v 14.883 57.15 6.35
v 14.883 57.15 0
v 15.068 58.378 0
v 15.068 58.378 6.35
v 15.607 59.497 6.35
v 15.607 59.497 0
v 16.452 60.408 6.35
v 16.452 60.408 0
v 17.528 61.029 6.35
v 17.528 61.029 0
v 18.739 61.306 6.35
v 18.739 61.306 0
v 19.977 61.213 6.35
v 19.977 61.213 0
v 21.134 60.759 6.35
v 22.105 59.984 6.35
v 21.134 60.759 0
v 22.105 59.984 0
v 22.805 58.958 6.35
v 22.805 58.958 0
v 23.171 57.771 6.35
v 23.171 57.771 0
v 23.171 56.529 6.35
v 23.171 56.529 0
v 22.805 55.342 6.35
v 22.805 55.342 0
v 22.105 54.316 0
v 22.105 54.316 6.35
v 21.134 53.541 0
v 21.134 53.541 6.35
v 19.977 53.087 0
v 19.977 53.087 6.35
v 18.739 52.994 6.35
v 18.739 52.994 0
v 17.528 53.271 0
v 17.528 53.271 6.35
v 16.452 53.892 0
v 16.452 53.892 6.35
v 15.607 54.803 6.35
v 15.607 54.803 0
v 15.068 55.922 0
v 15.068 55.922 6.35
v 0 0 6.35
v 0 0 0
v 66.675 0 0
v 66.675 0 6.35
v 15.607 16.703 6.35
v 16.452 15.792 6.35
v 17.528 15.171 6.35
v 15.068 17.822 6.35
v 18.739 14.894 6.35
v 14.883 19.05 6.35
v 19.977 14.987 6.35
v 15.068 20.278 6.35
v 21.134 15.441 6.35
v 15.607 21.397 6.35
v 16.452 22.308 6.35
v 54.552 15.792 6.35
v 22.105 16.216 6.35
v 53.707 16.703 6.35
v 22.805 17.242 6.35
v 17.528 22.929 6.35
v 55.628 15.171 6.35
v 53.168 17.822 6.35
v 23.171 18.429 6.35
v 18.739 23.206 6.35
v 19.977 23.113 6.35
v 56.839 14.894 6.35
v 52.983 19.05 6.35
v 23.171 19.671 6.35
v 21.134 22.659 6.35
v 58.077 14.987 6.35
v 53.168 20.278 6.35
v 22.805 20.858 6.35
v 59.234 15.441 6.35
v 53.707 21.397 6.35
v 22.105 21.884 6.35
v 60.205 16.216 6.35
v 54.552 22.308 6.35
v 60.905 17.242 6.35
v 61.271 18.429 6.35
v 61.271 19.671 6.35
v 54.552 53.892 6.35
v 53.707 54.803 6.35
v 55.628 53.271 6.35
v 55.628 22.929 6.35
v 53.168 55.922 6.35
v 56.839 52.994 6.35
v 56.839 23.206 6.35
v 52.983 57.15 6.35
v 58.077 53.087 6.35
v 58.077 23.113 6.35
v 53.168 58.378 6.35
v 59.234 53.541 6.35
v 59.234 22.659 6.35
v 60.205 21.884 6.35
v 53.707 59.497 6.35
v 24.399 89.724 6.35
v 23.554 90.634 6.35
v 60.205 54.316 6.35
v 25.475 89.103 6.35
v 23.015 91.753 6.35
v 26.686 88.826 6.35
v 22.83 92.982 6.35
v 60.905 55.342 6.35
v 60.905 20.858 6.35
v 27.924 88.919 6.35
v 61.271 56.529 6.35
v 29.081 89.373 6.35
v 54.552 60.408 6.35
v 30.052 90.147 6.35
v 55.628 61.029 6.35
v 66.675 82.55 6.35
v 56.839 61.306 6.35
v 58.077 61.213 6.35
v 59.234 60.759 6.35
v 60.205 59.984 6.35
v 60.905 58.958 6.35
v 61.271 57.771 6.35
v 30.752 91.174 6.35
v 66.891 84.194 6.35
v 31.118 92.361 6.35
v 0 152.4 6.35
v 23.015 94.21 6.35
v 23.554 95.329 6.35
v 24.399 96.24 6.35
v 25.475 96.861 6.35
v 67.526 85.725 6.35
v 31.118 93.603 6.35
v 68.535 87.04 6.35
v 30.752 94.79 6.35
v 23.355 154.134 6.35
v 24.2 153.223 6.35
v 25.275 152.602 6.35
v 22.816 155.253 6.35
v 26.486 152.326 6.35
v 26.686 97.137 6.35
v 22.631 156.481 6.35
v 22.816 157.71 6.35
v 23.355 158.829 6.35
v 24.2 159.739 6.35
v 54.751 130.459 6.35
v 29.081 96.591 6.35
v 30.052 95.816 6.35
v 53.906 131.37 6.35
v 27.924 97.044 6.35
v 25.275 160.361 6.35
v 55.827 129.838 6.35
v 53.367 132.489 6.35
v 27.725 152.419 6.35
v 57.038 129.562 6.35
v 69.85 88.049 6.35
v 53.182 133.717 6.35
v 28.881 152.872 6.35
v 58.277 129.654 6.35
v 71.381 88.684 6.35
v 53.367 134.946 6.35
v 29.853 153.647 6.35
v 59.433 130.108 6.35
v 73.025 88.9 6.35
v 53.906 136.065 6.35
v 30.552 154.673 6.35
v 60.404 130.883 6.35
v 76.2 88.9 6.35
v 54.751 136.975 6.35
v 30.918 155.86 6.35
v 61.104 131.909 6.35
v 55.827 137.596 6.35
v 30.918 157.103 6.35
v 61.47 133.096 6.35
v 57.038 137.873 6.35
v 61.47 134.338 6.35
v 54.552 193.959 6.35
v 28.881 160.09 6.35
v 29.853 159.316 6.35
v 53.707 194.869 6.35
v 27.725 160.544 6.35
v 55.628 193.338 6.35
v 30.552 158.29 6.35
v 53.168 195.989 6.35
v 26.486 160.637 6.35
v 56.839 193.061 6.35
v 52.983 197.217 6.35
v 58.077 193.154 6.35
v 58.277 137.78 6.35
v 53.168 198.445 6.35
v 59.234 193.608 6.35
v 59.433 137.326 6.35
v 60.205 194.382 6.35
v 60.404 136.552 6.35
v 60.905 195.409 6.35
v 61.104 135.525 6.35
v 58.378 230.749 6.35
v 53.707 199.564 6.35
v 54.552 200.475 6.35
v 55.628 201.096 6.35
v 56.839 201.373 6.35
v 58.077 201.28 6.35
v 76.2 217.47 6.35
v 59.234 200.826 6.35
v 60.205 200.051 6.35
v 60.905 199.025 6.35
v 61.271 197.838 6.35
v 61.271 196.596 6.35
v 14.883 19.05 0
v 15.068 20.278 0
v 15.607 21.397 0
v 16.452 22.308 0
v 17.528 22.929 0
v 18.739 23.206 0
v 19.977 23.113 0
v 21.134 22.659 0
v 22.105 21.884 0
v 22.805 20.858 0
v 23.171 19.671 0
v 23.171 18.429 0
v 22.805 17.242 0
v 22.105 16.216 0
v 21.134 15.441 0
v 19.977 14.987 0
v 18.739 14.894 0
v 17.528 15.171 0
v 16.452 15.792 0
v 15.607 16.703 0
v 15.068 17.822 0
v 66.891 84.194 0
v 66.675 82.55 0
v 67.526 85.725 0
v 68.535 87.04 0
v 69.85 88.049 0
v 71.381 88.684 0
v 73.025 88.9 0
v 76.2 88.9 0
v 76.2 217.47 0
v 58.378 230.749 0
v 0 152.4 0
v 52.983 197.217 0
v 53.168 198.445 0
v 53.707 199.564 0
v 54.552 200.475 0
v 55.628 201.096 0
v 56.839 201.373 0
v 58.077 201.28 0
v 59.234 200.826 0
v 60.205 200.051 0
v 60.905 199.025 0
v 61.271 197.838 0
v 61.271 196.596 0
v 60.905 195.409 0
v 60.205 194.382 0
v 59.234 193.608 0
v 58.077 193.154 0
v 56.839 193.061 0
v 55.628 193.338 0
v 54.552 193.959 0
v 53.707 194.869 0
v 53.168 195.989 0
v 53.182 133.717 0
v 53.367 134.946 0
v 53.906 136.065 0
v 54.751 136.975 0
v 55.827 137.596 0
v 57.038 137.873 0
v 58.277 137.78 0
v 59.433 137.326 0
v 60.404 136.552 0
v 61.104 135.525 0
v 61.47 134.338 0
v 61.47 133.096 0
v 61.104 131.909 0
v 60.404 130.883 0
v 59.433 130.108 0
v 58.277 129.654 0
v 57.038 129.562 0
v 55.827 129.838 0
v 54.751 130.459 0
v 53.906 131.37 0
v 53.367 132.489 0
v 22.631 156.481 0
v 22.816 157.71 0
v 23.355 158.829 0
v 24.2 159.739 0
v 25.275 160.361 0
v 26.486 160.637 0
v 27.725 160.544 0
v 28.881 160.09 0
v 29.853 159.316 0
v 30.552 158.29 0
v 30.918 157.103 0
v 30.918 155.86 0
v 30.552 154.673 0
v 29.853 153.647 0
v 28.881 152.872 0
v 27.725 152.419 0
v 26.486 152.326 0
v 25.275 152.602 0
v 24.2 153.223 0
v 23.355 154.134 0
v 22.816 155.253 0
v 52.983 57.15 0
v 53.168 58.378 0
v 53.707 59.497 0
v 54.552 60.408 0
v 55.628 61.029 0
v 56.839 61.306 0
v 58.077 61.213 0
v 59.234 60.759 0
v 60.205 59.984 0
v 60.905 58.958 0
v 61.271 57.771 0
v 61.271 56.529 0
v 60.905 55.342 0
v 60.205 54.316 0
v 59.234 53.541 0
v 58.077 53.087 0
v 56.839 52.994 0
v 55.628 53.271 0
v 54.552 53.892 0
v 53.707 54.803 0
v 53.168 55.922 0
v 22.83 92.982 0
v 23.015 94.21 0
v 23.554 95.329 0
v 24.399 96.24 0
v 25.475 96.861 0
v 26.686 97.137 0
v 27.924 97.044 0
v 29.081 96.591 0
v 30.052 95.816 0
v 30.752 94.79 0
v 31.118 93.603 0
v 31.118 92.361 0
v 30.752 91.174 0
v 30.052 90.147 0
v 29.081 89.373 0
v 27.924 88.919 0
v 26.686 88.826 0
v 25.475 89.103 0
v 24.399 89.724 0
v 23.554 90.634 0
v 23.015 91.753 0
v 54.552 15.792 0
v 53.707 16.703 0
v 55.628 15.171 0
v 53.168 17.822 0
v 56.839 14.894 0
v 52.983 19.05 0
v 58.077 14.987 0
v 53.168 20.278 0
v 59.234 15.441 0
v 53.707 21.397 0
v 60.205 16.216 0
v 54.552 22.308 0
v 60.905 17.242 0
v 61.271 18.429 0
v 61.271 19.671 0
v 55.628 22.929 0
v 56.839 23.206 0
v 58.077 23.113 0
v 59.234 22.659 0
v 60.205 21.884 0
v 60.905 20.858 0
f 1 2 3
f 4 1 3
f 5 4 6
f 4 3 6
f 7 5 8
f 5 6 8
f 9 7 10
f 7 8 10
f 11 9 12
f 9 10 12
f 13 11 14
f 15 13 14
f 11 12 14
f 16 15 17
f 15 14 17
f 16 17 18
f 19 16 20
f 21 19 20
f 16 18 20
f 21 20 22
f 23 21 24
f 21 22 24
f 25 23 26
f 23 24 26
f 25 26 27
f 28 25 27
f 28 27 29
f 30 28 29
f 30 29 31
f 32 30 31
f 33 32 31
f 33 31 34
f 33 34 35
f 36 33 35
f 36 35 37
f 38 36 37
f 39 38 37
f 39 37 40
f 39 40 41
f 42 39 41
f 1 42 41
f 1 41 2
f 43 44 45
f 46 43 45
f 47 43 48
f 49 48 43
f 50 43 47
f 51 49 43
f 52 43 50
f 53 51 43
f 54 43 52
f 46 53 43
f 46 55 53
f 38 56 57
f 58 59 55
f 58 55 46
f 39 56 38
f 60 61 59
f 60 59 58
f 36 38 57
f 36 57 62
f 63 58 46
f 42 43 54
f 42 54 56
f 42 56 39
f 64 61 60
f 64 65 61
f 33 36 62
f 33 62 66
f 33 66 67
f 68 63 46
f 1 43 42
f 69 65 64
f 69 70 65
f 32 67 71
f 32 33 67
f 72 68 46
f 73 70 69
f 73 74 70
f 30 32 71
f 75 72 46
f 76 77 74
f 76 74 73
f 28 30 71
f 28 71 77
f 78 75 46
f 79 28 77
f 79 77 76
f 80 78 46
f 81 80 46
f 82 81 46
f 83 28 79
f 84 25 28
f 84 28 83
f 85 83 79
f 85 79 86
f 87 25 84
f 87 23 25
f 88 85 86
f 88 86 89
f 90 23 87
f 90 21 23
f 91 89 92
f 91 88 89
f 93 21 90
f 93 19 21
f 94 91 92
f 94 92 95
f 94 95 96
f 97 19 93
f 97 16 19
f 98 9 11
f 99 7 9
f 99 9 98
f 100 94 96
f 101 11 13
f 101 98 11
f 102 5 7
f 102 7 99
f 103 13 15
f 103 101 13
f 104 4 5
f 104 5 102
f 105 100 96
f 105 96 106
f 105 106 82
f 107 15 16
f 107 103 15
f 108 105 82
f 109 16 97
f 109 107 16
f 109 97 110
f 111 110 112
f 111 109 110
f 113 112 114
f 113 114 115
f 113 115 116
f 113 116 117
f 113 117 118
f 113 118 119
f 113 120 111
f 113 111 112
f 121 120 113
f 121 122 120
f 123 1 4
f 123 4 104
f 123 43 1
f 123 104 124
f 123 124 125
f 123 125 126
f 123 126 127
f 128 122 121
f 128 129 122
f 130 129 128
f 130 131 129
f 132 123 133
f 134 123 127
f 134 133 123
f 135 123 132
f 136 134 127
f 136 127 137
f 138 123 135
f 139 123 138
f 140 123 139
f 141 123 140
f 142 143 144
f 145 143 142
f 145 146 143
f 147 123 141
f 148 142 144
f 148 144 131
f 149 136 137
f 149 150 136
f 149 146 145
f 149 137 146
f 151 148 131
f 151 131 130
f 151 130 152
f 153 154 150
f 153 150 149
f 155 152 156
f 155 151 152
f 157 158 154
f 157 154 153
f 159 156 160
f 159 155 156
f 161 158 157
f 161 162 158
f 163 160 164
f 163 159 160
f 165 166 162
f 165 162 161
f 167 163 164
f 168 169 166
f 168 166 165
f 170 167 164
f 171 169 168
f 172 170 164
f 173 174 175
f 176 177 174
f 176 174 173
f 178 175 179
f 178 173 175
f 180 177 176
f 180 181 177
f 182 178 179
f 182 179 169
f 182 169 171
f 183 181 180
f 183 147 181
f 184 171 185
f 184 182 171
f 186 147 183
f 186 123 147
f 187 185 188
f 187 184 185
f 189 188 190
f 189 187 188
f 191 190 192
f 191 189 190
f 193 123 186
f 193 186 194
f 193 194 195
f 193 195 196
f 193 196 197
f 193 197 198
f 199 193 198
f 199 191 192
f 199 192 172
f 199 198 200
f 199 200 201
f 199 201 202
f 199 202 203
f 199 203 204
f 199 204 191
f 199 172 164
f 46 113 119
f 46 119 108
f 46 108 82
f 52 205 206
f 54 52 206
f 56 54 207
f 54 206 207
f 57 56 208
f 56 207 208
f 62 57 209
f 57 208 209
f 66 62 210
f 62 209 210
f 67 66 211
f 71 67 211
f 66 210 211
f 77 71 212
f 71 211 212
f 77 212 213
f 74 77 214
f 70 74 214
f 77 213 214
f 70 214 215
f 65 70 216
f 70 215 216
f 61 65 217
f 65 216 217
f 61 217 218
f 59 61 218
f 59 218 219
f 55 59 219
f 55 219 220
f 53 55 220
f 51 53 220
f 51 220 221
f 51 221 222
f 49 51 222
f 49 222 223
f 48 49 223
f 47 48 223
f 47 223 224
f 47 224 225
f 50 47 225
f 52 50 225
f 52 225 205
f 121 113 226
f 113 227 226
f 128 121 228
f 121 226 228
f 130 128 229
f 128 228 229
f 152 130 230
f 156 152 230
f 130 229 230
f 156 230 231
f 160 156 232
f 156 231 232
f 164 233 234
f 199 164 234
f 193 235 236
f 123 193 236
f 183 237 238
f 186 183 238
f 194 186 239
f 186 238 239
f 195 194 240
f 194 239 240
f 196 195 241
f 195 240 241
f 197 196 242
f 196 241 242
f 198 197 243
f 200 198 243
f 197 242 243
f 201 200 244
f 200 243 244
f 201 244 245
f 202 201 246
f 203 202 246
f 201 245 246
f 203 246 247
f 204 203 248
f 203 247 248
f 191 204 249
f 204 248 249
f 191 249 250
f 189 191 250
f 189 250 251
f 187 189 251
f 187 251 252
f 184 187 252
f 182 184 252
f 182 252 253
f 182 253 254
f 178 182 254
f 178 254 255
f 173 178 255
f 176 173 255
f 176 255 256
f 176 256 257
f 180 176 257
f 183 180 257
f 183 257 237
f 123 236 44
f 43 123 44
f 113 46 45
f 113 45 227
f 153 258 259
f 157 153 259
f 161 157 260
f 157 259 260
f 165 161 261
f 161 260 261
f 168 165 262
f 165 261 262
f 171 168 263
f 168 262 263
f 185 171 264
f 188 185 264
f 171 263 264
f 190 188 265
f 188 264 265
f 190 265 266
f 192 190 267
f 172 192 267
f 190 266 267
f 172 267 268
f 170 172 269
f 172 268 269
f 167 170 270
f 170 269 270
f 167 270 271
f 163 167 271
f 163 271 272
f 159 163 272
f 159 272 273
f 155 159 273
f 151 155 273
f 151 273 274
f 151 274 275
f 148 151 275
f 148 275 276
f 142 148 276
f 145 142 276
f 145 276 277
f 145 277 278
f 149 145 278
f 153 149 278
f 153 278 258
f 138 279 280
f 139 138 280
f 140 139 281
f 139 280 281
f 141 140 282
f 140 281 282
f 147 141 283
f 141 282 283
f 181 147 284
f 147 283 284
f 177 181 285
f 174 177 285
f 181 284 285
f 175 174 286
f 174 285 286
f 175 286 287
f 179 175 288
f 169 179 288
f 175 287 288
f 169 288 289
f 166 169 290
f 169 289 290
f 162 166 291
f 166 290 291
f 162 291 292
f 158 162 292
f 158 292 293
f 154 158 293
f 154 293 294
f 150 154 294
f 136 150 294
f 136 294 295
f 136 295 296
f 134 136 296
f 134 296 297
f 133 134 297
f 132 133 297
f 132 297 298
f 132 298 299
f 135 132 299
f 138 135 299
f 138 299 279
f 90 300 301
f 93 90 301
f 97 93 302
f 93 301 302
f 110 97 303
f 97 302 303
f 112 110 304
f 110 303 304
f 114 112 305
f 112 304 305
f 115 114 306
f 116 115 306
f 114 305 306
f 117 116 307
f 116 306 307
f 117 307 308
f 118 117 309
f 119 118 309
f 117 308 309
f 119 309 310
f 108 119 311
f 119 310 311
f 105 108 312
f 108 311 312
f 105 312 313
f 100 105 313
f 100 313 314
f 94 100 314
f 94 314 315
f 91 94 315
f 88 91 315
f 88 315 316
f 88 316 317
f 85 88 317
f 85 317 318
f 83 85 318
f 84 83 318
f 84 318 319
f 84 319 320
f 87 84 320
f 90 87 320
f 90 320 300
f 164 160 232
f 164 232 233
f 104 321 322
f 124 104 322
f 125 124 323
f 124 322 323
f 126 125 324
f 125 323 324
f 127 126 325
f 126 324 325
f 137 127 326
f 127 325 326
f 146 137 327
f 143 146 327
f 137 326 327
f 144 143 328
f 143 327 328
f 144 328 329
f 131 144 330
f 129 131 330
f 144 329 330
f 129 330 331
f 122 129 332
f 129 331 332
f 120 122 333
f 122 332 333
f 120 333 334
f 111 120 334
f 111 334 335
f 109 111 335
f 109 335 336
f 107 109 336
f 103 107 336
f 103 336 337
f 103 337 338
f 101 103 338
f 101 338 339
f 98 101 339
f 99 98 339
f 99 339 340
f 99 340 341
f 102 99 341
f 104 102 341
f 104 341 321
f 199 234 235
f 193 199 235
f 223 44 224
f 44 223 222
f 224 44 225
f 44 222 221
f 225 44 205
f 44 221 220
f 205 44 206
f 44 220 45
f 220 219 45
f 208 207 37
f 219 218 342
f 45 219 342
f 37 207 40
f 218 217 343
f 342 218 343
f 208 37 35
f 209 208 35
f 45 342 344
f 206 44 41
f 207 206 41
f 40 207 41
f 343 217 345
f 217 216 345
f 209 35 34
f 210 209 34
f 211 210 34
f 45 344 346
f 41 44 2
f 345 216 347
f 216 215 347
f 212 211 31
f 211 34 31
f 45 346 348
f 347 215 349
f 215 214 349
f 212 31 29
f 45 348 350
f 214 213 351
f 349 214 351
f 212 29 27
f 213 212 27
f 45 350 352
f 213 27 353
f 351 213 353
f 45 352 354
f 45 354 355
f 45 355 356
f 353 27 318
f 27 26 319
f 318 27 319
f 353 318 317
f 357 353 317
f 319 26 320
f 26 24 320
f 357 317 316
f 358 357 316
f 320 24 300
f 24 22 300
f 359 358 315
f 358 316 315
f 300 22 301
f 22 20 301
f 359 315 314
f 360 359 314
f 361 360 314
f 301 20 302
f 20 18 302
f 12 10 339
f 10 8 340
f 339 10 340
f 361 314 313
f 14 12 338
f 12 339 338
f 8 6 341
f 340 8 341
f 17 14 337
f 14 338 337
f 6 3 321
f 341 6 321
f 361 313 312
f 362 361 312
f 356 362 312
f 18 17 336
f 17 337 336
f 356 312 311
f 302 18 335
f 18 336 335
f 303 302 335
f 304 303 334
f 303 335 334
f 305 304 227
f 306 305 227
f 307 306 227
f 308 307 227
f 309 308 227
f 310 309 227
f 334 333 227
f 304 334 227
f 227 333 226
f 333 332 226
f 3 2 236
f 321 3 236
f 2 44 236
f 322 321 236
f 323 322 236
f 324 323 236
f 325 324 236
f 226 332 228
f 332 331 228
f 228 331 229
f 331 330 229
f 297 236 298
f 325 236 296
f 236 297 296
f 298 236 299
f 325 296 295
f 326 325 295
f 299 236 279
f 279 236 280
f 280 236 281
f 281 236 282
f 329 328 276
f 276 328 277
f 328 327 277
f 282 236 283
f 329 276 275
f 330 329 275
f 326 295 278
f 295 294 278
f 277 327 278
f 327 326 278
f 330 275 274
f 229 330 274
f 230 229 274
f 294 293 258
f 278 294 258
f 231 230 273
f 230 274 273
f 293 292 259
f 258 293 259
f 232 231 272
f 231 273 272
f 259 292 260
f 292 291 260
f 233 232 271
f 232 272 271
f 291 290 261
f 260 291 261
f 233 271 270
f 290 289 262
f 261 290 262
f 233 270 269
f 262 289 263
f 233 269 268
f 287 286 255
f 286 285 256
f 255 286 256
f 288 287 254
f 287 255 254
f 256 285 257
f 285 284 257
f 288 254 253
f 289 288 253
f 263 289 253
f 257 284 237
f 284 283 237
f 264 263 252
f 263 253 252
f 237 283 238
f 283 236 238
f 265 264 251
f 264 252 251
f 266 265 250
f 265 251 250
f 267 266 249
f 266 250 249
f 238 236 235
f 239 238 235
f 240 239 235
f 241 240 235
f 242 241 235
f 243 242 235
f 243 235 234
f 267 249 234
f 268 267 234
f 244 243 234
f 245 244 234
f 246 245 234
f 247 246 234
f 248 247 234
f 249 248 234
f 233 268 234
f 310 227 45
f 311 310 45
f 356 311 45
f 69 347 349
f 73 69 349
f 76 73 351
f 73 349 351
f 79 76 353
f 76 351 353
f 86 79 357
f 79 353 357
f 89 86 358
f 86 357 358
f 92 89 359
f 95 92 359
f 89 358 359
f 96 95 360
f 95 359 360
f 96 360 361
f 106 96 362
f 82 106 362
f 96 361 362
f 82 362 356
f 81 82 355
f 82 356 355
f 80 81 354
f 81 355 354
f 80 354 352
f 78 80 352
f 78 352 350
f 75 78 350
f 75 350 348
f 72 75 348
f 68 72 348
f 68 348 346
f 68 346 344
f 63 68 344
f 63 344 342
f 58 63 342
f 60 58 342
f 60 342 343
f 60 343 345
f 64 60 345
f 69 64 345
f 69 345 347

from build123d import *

# Parameters (mm, degrees)
BOSS_EXTRUDE1_DEPTH              = 6.35
F_21_64_0_32813_DIAMETER_HOLE1_D = 8.334502
LPATTERN1_COUNT                  = 2
LPATTERN1_PITCH                  = 38.1
LPATTERN1_COUNT_DIR2             = 2
LPATTERN1_PITCH_DIR2             = 38.1
F_21_64_0_32813_DIAMETER_HOLE2_D = 8.334502
LPATTERN2_COUNT                  = 3
LPATTERN2_PITCH                  = 50.8
LPATTERN2_COUNT_DIR2             = 2
LPATTERN2_PITCH_DIR2             = 38.1
SKETCH7_W                        = 9.525
SKETCH7_H                        = 88.9
CUT_EXTRUDE1_DEPTH               = 244.088107491
FILLET1_R                        = 6.35


with BuildPart() as part:
    # Sketch2 → Boss-Extrude1 (new body)
    with BuildSketch(Plane.XY):
        Polygon((0, 0), (76.2, 0), (76.2, 217.469814476), (58.378218394, 230.748923082), (0, 152.4), align=None)
    extrude(amount=BOSS_EXTRUDE1_DEPTH)

    # 21/64 (0.32813) Diameter Hole1 (through all)
    with Locations(Plane.XY.offset(6.35)):
        with Locations((57.15, 19.05)):
            f_21_64_0_32813_diameter_hole1 = Hole(F_21_64_0_32813_DIAMETER_HOLE1_D / 2)

    # LPattern1: 21_64 _0.32813_ Diameter Hole1 2 × 2
    with Locations(*[(-i * LPATTERN1_PITCH, j * LPATTERN1_PITCH_DIR2, 0) for i in range(LPATTERN1_COUNT) for j in range(LPATTERN1_COUNT_DIR2) if (i, j) != (0, 0)]):
        add(f_21_64_0_32813_diameter_hole1, mode=Mode.SUBTRACT)

    # 21/64 (0.32813) Diameter Hole2 (through all)
    with Locations(Plane.XY.offset(6.35)):
        with Locations((57.15, 197.2169065)):
            f_21_64_0_32813_diameter_hole2 = Hole(F_21_64_0_32813_DIAMETER_HOLE2_D / 2)

    # LPattern2: 21_64 _0.32813_ Diameter Hole2 3 × 2, 2 skipped
    with Locations(*[Vector(-0.597485201625335, -0.8018799372965586, 0) * (i * LPATTERN2_PITCH) + Vector(0.8018799372965592, -0.5974852016253344, 0) * (j * LPATTERN2_PITCH_DIR2) for i in range(LPATTERN2_COUNT) for j in range(LPATTERN2_COUNT_DIR2) if (i, j) not in ((0, 0), (0, 1), (2, 0))]):
        add(f_21_64_0_32813_diameter_hole2, mode=Mode.SUBTRACT)

    # Sketch7 → Cut-Extrude1 (cut, through all)
    with BuildSketch(Plane.XY.offset(6.35)):
        with Locations((71.4375, 44.45)):
            Rectangle(SKETCH7_W, SKETCH7_H)
    extrude(amount=-CUT_EXTRUDE1_DEPTH, mode=Mode.SUBTRACT)

    # Fillet1
    fillet1_edges = [part.edges().sort_by_distance(p)[0] for p in [
        (66.675, 88.9, 3.175),
    ]]
    fillet(fillet1_edges, radius=FILLET1_R)


solid = part.part
